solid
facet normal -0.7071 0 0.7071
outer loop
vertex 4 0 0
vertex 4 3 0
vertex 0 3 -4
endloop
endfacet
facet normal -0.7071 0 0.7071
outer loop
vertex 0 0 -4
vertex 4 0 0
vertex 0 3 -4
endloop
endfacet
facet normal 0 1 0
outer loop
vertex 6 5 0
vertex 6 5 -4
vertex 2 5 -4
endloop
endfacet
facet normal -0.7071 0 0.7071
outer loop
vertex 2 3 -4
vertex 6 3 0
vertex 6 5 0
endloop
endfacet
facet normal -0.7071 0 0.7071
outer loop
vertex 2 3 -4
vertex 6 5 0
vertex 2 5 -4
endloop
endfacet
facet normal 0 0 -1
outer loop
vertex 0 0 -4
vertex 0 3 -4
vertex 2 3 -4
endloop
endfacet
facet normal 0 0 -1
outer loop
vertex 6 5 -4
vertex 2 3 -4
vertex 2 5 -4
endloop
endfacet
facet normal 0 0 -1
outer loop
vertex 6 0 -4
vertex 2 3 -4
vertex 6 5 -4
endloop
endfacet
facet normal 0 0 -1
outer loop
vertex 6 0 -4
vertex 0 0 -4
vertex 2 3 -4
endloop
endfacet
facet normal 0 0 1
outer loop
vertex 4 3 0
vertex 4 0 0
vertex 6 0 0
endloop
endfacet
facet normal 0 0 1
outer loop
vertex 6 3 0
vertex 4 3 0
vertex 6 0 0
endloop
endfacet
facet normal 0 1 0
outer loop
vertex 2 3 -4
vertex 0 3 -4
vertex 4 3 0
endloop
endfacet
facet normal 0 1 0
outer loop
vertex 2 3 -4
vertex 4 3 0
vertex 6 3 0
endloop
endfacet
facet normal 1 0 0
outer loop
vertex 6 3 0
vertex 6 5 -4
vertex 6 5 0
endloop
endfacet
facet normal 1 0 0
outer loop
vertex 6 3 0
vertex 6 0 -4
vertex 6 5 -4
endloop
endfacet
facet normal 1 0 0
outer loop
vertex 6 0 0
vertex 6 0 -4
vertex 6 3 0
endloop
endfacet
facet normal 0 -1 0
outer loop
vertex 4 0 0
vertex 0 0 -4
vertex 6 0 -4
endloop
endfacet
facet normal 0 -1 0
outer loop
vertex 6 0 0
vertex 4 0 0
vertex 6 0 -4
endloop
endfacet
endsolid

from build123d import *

# Parameters (mm, degrees)
SKETCH1_W           = 6
SKETCH1_H           = 4
BOSS_EXTRUDE1_DEPTH = 3
BOSS_EXTRUDE2_DEPTH = 2
CUT_EXTRUDE1_DEPTH  = 10


with BuildPart() as part:
    # Sketch1 → Boss-Extrude1 (new body)
    with BuildSketch(Plane(origin=(0, 0, 0), x_dir=(1, 0, 0), z_dir=(0, 1, 0))):
        with Locations((3, 2)):
            Rectangle(SKETCH1_W, SKETCH1_H)
    extrude(amount=BOSS_EXTRUDE1_DEPTH)

    # Sketch3 → Boss-Extrude2 (add)
    with BuildSketch(Plane(origin=(0, 3, 0), x_dir=(1, 0, 0), z_dir=(0, 1, 0))):
        Polygon((6, 4), (6, 0), (2, 4), align=None)
    extrude(amount=BOSS_EXTRUDE2_DEPTH)

    # Sketch4 → Cut-Extrude1 (cut)
    with BuildSketch(Plane(origin=(0, 3, 0), x_dir=(1, 0, 0), z_dir=(0, 1, 0))):
        Polygon((4, 0), (0, 4), (0, 0), align=None)
    extrude(amount=-CUT_EXTRUDE1_DEPTH, mode=Mode.SUBTRACT)


solid = part.part
